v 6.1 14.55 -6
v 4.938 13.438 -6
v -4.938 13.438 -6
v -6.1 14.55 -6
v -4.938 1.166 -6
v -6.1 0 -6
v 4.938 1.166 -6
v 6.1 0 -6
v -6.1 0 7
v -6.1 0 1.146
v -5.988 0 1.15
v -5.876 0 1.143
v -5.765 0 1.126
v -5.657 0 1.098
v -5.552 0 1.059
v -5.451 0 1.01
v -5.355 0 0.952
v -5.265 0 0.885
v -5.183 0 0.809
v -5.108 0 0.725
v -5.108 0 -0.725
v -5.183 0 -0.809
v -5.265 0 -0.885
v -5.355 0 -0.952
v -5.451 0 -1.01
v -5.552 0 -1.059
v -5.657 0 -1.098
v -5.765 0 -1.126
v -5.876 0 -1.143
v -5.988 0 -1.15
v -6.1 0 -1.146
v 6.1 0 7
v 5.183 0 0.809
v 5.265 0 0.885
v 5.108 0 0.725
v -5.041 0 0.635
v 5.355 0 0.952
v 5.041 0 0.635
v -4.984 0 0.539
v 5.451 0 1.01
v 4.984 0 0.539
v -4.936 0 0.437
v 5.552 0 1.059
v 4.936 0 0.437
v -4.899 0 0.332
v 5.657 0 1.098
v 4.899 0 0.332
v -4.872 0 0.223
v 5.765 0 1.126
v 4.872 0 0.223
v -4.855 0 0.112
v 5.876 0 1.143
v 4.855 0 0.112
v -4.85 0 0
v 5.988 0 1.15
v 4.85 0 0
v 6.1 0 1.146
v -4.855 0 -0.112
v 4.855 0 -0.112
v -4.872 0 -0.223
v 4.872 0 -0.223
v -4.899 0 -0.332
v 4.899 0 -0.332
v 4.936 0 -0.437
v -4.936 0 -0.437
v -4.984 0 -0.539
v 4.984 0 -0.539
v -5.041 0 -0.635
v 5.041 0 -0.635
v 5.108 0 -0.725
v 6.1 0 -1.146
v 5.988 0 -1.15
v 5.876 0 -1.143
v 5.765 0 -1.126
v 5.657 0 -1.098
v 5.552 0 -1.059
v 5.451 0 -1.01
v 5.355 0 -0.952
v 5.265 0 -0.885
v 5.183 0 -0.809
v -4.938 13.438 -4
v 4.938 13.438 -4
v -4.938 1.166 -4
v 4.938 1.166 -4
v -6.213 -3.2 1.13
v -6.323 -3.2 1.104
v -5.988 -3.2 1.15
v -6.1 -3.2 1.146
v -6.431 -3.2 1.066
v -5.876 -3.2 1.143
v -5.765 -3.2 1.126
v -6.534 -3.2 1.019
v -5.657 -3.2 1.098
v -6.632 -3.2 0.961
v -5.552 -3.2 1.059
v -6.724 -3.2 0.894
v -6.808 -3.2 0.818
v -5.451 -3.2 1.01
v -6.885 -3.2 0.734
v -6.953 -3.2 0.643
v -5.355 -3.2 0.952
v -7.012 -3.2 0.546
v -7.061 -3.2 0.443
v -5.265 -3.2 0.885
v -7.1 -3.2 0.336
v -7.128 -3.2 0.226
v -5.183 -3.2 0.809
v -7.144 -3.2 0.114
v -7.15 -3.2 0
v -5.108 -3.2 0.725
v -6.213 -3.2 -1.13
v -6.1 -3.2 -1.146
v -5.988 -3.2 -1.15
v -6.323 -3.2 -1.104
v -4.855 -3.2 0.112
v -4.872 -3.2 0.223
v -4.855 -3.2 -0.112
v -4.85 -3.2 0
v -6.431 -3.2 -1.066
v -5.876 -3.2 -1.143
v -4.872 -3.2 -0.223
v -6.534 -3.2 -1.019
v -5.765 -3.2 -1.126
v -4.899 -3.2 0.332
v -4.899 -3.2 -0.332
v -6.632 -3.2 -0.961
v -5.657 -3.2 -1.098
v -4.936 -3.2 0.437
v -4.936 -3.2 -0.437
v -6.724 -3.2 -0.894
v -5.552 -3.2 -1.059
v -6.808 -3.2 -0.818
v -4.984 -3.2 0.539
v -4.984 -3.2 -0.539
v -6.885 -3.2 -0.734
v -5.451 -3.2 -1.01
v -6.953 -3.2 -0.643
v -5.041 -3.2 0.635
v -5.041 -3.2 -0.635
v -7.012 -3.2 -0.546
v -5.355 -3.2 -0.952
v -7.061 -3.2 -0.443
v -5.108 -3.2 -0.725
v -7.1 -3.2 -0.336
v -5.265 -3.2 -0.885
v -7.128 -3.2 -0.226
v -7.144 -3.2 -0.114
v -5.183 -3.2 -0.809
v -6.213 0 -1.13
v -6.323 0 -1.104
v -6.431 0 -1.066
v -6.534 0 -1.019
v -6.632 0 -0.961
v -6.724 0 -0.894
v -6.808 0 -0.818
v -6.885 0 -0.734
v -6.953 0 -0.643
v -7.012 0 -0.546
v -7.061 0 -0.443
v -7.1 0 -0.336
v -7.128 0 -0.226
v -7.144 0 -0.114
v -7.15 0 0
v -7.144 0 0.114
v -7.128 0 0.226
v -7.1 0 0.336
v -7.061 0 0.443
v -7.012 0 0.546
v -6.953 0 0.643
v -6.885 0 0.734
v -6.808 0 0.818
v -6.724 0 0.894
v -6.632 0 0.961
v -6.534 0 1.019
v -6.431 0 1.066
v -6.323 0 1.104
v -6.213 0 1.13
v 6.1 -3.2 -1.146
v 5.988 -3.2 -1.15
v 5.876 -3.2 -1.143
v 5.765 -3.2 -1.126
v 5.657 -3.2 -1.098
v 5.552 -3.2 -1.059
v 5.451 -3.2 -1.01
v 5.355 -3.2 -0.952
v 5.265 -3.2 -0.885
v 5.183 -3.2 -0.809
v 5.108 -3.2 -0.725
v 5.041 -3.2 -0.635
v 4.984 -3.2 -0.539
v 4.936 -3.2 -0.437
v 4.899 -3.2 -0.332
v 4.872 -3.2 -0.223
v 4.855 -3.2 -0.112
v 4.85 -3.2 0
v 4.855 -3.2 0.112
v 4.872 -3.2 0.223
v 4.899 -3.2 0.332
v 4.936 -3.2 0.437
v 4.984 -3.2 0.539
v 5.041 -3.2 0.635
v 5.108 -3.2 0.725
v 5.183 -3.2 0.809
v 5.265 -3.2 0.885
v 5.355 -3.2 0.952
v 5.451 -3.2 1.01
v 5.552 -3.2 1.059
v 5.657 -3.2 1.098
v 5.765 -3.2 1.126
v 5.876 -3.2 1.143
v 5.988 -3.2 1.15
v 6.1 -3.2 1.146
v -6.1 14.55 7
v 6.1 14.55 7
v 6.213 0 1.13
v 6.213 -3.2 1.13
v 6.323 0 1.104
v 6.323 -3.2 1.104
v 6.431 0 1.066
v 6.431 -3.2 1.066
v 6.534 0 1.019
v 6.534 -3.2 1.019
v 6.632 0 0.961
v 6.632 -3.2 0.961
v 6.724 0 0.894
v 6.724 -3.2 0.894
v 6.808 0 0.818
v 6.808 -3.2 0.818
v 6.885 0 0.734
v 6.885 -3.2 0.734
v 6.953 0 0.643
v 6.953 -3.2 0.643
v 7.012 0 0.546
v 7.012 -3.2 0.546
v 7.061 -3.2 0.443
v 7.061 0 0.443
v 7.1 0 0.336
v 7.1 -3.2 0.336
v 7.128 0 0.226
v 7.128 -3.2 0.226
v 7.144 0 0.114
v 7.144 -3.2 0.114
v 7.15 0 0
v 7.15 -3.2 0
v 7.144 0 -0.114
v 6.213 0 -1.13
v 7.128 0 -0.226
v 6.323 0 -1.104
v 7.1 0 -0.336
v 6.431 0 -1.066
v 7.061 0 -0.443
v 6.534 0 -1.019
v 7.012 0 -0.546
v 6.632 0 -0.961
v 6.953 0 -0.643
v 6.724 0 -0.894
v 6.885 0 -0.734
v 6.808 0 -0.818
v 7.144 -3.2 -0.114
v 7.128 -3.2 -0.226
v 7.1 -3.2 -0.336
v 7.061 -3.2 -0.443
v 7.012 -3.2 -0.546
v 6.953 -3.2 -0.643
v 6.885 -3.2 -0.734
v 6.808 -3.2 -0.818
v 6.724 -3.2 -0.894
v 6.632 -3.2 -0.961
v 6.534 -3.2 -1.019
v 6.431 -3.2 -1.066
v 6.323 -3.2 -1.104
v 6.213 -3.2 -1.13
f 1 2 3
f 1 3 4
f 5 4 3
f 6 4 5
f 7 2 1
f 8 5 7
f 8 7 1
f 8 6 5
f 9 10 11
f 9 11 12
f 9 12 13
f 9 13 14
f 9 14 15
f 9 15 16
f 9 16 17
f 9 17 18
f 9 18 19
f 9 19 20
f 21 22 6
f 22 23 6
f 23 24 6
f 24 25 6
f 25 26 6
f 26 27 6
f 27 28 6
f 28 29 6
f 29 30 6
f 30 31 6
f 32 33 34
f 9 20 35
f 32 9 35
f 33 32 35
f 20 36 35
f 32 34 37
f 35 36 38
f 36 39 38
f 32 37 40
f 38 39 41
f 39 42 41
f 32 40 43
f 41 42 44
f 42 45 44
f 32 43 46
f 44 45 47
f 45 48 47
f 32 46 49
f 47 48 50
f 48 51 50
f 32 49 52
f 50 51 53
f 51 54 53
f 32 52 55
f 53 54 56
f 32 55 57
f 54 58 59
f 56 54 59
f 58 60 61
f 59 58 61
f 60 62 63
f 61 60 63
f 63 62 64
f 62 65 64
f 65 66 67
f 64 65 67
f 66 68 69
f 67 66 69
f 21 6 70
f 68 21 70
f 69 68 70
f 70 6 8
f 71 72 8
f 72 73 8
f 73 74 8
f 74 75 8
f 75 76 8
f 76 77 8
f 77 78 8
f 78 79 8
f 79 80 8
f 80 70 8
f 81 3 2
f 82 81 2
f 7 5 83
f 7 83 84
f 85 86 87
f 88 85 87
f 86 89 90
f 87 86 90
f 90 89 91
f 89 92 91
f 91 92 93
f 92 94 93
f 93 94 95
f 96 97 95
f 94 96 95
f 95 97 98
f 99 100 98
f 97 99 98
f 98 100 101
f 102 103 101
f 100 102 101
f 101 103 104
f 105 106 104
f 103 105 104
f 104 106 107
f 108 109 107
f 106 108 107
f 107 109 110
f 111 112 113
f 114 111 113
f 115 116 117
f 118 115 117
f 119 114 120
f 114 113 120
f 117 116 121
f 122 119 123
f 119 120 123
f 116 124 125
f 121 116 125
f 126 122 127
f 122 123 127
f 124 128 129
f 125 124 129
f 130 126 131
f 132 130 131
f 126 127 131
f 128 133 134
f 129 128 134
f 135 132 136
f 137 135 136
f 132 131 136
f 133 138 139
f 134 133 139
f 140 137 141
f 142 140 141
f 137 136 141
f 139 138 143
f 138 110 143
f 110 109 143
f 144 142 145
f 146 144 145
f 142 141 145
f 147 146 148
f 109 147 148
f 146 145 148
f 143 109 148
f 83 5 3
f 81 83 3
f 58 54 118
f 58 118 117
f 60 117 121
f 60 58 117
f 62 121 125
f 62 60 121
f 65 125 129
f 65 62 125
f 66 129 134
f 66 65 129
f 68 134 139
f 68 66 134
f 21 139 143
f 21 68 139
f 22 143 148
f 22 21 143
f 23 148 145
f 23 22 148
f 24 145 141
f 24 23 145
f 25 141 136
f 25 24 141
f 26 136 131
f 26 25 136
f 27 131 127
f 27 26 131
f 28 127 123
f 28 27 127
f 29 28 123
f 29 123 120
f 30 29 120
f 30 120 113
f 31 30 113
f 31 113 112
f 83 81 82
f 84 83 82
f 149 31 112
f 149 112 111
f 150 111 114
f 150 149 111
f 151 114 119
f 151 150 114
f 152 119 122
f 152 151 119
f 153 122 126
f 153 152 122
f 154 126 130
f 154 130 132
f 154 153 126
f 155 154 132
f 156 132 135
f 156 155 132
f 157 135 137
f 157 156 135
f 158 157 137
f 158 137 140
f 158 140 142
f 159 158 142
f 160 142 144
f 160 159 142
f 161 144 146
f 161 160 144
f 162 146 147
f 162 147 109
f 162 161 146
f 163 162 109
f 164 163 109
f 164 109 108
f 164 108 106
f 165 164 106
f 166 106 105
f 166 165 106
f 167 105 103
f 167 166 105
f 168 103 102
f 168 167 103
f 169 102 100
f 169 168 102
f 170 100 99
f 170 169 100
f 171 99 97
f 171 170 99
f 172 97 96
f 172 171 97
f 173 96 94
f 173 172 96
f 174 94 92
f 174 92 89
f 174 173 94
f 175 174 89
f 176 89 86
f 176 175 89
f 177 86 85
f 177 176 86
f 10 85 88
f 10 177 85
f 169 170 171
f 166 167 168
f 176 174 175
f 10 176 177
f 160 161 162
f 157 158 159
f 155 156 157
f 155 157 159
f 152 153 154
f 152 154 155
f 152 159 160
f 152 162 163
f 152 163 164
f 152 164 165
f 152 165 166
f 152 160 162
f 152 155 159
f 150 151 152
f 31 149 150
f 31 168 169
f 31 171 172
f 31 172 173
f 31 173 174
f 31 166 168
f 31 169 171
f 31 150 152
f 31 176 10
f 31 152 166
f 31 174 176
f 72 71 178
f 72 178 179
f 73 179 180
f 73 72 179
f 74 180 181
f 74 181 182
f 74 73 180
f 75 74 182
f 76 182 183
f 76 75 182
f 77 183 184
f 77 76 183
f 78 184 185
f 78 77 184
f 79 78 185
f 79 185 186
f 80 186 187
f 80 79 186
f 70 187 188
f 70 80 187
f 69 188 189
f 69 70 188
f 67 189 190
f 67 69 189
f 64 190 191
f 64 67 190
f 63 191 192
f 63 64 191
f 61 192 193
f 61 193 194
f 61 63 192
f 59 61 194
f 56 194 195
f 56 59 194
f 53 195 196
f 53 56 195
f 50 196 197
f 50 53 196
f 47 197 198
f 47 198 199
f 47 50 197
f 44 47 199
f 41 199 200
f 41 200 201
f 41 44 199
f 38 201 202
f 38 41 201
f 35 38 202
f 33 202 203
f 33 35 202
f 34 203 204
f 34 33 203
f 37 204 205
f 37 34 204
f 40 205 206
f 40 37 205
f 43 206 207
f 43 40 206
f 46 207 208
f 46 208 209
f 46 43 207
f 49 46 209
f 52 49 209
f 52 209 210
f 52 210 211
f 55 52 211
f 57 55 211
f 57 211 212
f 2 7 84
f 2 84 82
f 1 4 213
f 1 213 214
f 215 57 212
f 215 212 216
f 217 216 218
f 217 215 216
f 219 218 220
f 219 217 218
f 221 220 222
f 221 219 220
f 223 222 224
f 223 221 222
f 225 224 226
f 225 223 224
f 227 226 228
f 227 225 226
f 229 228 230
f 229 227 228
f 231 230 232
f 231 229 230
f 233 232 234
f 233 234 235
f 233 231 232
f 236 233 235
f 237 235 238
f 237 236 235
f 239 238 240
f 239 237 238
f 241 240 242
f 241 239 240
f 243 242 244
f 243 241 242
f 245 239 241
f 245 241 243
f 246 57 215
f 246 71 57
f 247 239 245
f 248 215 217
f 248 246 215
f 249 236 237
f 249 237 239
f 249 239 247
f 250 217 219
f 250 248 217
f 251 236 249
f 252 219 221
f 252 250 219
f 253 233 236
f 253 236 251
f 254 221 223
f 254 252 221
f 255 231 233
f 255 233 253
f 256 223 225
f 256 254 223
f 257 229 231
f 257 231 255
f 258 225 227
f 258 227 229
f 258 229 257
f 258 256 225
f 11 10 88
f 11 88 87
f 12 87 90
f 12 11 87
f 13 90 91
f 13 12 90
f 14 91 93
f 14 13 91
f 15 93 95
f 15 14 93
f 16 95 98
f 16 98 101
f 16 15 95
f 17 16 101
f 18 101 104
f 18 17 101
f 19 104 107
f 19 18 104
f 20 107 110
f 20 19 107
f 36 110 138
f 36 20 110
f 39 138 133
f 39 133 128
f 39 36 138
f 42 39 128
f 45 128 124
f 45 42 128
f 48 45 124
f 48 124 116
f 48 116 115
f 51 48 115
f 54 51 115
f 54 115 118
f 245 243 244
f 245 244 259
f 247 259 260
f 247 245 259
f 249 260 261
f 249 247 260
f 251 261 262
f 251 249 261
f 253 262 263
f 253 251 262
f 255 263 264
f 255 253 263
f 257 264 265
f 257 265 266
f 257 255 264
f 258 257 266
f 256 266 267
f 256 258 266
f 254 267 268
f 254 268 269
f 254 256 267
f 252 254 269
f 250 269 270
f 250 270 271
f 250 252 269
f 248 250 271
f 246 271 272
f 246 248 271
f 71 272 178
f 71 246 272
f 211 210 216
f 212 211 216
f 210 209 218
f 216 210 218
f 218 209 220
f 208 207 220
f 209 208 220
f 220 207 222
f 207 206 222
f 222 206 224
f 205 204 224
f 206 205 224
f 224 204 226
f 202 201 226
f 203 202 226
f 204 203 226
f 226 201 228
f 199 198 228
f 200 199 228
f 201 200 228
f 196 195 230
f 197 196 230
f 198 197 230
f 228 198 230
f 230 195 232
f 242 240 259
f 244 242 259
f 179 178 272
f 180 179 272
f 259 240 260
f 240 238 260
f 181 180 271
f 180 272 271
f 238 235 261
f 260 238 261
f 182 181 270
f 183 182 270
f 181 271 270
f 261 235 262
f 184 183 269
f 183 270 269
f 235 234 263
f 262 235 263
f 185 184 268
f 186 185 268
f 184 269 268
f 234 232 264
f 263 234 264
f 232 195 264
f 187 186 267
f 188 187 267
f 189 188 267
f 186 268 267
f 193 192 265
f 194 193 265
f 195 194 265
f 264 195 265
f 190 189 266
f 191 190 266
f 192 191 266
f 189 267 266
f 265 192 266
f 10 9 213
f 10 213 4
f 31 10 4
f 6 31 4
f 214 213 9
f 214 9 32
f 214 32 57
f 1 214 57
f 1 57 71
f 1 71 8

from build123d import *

# Parameters (mm, degrees)
BOSS_EXTRUDE1_DEPTH = 3.2
SKETCH1_3_W         = 12.2
SKETCH1_3_H         = 13
BOSS_EXTRUDE2_DEPTH = 14.55
CUT_EXTRUDE1_START  = -6
SKETCH2_W           = 9.87658836
SKETCH2_H           = 12.271413297
CUT_EXTRUDE1_DEPTH  = 2


with BuildPart() as part:
    # Sketch1 → Boss-Extrude1 (new body)
    with BuildSketch(Plane(origin=(0, 0, 0), x_dir=(1, 0, 0), z_dir=(0, 1, 0))):
        with BuildLine():
            ThreePointArc((-4.85, 0), (-5.222986487, 0.847791248), (-6.1, 1.145643924))
            Line((-6.1, 1.145643924), (-6.1, -1.145643924))
            ThreePointArc((-6.1, -1.145643924), (-5.222986487, -0.847791248), (-4.85, 0))
        make_face()
        with BuildLine():
            Line((-6.1, -1.145643924), (-6.1, 1.145643924))
            ThreePointArc((-6.1, 1.145643924), (-7.15, 0), (-6.1, -1.145643924))
        make_face()
        with BuildLine():
            ThreePointArc((7.15, 0), (6.847791248, 0.777013513), (6.1, 1.145643924))
            Line((6.1, 1.145643924), (6.1, -1.145643924))
            ThreePointArc((6.1, -1.145643924), (6.847791248, -0.777013513), (7.15, 0))
        make_face()
        with BuildLine():
            Line((6.1, -1.145643924), (6.1, 1.145643924))
            ThreePointArc((6.1, 1.145643924), (4.85, 0), (6.1, -1.145643924))
        make_face()
    extrude(amount=-BOSS_EXTRUDE1_DEPTH)

    # Sketch1<3> → Boss-Extrude2 (add)
    with BuildSketch(Plane(origin=(0, 0, 0), x_dir=(1, 0, 0), z_dir=(0, 1, 0))):
        with Locations((0, -0.5)):
            Rectangle(SKETCH1_3_W, SKETCH1_3_H)
    extrude(amount=BOSS_EXTRUDE2_DEPTH)

    # Sketch2 → Cut-Extrude1 (cut)
    with BuildSketch(Plane.XY.offset(CUT_EXTRUDE1_START)):
        with Locations((0, 7.301829354)):
            Rectangle(SKETCH2_W, SKETCH2_H)
    extrude(amount=CUT_EXTRUDE1_DEPTH, mode=Mode.SUBTRACT)


solid = part.part
